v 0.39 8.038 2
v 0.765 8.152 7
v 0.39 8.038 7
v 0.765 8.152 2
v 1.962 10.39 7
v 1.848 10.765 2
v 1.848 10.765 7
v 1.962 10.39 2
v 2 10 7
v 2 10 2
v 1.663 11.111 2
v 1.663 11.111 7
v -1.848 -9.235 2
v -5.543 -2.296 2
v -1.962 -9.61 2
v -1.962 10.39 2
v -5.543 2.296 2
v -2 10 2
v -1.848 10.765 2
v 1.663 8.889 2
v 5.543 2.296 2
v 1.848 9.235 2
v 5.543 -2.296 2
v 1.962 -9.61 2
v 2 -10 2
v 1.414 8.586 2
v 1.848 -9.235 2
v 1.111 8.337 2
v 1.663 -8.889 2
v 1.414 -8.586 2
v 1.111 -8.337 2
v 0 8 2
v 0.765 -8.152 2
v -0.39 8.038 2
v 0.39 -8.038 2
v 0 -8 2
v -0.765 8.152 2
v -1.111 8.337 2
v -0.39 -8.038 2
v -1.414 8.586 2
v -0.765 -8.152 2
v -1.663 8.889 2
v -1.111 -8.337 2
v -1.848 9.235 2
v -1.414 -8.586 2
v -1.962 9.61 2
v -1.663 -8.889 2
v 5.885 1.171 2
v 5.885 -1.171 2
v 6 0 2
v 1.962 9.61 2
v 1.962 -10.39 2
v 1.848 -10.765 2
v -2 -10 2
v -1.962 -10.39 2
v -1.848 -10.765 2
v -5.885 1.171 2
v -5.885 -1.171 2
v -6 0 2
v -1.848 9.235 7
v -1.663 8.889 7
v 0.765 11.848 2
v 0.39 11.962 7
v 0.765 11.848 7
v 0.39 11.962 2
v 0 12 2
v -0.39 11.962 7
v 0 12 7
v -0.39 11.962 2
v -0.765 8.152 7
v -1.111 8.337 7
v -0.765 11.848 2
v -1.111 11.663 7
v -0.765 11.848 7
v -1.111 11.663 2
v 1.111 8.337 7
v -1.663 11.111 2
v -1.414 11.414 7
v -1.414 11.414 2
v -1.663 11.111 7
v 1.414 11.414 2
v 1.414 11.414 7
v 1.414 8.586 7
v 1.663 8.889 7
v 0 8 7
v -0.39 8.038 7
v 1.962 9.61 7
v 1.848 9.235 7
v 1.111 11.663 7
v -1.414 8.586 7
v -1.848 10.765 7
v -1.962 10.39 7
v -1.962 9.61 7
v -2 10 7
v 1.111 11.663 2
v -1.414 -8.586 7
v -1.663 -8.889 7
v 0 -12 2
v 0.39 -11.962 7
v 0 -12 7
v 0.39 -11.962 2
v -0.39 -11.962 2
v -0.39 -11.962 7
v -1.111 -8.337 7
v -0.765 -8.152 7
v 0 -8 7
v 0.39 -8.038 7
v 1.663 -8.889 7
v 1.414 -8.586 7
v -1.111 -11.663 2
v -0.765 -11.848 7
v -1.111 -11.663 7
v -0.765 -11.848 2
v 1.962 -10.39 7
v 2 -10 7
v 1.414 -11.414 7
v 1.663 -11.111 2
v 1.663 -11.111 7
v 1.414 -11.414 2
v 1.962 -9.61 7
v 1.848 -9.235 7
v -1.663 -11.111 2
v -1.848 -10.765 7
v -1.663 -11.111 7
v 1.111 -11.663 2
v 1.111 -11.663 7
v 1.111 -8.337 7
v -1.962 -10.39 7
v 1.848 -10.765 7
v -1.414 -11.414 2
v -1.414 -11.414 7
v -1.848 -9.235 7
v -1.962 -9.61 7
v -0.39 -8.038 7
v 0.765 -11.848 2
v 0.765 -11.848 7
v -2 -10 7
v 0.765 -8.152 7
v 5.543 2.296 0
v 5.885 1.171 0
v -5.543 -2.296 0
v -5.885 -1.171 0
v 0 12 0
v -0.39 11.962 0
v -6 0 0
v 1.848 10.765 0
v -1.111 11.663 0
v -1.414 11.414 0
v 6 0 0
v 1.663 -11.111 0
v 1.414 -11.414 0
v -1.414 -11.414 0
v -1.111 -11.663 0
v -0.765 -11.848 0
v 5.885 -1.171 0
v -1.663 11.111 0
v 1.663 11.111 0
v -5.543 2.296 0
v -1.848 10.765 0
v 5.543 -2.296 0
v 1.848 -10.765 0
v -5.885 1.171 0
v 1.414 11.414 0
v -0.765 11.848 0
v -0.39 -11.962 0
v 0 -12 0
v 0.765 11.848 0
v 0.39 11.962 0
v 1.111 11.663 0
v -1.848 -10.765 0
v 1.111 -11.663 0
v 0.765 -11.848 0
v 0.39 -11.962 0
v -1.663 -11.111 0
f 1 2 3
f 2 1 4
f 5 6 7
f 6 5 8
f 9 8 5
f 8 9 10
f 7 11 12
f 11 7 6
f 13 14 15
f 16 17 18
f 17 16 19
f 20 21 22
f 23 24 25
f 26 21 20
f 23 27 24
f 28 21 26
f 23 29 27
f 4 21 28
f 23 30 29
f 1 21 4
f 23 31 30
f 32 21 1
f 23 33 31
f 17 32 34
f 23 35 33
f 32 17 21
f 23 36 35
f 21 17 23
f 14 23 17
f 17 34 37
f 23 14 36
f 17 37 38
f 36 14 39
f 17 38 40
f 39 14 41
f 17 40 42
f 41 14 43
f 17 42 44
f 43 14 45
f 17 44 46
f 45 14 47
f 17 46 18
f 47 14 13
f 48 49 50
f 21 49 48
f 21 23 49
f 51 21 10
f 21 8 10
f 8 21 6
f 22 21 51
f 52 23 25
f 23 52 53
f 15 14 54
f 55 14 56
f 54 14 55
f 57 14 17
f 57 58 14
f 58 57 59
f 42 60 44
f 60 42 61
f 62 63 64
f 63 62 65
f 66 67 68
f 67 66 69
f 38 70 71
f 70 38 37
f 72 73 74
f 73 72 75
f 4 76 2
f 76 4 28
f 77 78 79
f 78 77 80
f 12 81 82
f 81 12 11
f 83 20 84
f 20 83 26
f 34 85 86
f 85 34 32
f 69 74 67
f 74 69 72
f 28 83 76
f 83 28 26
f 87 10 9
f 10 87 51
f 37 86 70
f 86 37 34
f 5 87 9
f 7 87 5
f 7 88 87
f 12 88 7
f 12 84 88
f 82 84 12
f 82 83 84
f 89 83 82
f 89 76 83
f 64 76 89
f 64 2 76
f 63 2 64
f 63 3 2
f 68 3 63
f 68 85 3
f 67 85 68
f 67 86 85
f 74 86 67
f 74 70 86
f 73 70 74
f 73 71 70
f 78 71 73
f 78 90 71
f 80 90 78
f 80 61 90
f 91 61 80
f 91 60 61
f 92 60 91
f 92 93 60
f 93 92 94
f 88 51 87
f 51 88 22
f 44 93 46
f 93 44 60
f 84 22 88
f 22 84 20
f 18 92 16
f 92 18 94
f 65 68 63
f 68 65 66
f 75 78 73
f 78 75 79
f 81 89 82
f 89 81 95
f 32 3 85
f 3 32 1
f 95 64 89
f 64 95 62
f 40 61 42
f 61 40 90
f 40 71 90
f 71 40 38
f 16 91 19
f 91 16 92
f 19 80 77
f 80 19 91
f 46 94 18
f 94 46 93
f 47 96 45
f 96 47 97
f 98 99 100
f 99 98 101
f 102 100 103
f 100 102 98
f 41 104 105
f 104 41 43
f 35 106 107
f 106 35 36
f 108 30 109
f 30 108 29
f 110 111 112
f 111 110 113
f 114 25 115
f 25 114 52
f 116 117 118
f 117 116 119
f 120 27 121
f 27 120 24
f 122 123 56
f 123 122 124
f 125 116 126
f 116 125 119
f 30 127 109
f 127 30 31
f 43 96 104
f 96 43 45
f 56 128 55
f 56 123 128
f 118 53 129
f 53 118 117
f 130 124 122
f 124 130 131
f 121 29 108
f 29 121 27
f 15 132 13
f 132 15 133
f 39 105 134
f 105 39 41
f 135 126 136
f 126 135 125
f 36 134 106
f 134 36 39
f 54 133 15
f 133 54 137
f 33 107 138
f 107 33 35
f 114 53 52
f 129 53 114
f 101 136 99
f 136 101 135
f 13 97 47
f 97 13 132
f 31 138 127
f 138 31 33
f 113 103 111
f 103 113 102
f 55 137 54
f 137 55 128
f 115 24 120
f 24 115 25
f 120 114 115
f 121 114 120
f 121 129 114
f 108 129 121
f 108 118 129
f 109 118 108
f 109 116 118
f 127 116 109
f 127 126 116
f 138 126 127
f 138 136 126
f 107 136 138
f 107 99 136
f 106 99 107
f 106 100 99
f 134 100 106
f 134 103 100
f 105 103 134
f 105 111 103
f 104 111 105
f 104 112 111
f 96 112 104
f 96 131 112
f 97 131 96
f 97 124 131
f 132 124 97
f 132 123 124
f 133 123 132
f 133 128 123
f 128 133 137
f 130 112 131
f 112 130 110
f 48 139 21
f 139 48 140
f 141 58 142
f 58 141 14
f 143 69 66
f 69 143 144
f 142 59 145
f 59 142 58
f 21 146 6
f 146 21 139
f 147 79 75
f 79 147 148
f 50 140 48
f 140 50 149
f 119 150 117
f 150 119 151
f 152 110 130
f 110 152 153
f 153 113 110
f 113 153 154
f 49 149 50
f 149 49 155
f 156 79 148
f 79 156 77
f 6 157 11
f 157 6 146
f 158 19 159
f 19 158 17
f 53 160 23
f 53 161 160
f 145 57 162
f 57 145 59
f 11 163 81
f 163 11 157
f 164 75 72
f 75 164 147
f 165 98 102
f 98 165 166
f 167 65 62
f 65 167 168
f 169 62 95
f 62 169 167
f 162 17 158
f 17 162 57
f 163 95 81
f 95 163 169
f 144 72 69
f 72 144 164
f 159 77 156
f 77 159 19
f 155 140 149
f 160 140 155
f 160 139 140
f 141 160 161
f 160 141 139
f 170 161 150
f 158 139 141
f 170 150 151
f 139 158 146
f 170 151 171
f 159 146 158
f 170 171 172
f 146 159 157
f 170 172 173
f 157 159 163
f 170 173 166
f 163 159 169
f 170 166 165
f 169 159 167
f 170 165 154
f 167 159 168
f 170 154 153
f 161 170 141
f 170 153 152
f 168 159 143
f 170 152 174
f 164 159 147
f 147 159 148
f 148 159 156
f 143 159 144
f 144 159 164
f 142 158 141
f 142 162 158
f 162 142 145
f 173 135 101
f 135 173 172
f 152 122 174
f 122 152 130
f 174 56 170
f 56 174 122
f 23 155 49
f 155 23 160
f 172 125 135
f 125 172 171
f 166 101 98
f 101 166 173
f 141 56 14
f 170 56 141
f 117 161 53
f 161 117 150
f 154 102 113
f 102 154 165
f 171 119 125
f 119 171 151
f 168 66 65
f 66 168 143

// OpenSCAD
include <lib.scad>;

function pvBallCasterYokeDatasheet(main_diameter, base_thickness, mount_offset, mount_diameter, mount_height=0) =
     assert(main_diameter > 0)
     assert(base_thickness > 0)
     assert(mount_offset > 0)
     assert(mount_diameter > 0)
     [["main_diameter", main_diameter], ["base_thickness", base_thickness],
      ["mount_offset", mount_offset], ["mount_diameter", mount_diameter],
      ["mount_height", mount_height]];

module pmBallCasterYoke(datasheet) {
     main_diameter = property(datasheet, "main_diameter");
     base_thickness = property(datasheet, "base_thickness");
     mount_offset = property(datasheet, "mount_offset");
     mount_diameter = property(datasheet, "mount_diameter");
     mount_height = property(datasheet, "mount_height");

     linear_extrude(height=base_thickness) {
          hull() {
               circle(d=main_diameter);
               duplicate([0, 1, 0]) {
                    translate([0, mount_offset, 0]) {
                         circle(d=mount_diameter);
                    }
               }
          }
     }
     if (mount_height > 0) {
          translate([0, 0, base_thickness]) {
               duplicate([0, 1, 0]) {
                    translate([0, mount_offset, 0]) {
                         cylinder(h=mount_height, d=mount_diameter);
                    }
               }
          }
     }
}

pmBallCasterYoke(
     datasheet=pvBallCasterYokeDatasheet(
          main_diameter=12, base_thickness=2, mount_offset=10, mount_diameter=4, mount_height=5
     )
);
